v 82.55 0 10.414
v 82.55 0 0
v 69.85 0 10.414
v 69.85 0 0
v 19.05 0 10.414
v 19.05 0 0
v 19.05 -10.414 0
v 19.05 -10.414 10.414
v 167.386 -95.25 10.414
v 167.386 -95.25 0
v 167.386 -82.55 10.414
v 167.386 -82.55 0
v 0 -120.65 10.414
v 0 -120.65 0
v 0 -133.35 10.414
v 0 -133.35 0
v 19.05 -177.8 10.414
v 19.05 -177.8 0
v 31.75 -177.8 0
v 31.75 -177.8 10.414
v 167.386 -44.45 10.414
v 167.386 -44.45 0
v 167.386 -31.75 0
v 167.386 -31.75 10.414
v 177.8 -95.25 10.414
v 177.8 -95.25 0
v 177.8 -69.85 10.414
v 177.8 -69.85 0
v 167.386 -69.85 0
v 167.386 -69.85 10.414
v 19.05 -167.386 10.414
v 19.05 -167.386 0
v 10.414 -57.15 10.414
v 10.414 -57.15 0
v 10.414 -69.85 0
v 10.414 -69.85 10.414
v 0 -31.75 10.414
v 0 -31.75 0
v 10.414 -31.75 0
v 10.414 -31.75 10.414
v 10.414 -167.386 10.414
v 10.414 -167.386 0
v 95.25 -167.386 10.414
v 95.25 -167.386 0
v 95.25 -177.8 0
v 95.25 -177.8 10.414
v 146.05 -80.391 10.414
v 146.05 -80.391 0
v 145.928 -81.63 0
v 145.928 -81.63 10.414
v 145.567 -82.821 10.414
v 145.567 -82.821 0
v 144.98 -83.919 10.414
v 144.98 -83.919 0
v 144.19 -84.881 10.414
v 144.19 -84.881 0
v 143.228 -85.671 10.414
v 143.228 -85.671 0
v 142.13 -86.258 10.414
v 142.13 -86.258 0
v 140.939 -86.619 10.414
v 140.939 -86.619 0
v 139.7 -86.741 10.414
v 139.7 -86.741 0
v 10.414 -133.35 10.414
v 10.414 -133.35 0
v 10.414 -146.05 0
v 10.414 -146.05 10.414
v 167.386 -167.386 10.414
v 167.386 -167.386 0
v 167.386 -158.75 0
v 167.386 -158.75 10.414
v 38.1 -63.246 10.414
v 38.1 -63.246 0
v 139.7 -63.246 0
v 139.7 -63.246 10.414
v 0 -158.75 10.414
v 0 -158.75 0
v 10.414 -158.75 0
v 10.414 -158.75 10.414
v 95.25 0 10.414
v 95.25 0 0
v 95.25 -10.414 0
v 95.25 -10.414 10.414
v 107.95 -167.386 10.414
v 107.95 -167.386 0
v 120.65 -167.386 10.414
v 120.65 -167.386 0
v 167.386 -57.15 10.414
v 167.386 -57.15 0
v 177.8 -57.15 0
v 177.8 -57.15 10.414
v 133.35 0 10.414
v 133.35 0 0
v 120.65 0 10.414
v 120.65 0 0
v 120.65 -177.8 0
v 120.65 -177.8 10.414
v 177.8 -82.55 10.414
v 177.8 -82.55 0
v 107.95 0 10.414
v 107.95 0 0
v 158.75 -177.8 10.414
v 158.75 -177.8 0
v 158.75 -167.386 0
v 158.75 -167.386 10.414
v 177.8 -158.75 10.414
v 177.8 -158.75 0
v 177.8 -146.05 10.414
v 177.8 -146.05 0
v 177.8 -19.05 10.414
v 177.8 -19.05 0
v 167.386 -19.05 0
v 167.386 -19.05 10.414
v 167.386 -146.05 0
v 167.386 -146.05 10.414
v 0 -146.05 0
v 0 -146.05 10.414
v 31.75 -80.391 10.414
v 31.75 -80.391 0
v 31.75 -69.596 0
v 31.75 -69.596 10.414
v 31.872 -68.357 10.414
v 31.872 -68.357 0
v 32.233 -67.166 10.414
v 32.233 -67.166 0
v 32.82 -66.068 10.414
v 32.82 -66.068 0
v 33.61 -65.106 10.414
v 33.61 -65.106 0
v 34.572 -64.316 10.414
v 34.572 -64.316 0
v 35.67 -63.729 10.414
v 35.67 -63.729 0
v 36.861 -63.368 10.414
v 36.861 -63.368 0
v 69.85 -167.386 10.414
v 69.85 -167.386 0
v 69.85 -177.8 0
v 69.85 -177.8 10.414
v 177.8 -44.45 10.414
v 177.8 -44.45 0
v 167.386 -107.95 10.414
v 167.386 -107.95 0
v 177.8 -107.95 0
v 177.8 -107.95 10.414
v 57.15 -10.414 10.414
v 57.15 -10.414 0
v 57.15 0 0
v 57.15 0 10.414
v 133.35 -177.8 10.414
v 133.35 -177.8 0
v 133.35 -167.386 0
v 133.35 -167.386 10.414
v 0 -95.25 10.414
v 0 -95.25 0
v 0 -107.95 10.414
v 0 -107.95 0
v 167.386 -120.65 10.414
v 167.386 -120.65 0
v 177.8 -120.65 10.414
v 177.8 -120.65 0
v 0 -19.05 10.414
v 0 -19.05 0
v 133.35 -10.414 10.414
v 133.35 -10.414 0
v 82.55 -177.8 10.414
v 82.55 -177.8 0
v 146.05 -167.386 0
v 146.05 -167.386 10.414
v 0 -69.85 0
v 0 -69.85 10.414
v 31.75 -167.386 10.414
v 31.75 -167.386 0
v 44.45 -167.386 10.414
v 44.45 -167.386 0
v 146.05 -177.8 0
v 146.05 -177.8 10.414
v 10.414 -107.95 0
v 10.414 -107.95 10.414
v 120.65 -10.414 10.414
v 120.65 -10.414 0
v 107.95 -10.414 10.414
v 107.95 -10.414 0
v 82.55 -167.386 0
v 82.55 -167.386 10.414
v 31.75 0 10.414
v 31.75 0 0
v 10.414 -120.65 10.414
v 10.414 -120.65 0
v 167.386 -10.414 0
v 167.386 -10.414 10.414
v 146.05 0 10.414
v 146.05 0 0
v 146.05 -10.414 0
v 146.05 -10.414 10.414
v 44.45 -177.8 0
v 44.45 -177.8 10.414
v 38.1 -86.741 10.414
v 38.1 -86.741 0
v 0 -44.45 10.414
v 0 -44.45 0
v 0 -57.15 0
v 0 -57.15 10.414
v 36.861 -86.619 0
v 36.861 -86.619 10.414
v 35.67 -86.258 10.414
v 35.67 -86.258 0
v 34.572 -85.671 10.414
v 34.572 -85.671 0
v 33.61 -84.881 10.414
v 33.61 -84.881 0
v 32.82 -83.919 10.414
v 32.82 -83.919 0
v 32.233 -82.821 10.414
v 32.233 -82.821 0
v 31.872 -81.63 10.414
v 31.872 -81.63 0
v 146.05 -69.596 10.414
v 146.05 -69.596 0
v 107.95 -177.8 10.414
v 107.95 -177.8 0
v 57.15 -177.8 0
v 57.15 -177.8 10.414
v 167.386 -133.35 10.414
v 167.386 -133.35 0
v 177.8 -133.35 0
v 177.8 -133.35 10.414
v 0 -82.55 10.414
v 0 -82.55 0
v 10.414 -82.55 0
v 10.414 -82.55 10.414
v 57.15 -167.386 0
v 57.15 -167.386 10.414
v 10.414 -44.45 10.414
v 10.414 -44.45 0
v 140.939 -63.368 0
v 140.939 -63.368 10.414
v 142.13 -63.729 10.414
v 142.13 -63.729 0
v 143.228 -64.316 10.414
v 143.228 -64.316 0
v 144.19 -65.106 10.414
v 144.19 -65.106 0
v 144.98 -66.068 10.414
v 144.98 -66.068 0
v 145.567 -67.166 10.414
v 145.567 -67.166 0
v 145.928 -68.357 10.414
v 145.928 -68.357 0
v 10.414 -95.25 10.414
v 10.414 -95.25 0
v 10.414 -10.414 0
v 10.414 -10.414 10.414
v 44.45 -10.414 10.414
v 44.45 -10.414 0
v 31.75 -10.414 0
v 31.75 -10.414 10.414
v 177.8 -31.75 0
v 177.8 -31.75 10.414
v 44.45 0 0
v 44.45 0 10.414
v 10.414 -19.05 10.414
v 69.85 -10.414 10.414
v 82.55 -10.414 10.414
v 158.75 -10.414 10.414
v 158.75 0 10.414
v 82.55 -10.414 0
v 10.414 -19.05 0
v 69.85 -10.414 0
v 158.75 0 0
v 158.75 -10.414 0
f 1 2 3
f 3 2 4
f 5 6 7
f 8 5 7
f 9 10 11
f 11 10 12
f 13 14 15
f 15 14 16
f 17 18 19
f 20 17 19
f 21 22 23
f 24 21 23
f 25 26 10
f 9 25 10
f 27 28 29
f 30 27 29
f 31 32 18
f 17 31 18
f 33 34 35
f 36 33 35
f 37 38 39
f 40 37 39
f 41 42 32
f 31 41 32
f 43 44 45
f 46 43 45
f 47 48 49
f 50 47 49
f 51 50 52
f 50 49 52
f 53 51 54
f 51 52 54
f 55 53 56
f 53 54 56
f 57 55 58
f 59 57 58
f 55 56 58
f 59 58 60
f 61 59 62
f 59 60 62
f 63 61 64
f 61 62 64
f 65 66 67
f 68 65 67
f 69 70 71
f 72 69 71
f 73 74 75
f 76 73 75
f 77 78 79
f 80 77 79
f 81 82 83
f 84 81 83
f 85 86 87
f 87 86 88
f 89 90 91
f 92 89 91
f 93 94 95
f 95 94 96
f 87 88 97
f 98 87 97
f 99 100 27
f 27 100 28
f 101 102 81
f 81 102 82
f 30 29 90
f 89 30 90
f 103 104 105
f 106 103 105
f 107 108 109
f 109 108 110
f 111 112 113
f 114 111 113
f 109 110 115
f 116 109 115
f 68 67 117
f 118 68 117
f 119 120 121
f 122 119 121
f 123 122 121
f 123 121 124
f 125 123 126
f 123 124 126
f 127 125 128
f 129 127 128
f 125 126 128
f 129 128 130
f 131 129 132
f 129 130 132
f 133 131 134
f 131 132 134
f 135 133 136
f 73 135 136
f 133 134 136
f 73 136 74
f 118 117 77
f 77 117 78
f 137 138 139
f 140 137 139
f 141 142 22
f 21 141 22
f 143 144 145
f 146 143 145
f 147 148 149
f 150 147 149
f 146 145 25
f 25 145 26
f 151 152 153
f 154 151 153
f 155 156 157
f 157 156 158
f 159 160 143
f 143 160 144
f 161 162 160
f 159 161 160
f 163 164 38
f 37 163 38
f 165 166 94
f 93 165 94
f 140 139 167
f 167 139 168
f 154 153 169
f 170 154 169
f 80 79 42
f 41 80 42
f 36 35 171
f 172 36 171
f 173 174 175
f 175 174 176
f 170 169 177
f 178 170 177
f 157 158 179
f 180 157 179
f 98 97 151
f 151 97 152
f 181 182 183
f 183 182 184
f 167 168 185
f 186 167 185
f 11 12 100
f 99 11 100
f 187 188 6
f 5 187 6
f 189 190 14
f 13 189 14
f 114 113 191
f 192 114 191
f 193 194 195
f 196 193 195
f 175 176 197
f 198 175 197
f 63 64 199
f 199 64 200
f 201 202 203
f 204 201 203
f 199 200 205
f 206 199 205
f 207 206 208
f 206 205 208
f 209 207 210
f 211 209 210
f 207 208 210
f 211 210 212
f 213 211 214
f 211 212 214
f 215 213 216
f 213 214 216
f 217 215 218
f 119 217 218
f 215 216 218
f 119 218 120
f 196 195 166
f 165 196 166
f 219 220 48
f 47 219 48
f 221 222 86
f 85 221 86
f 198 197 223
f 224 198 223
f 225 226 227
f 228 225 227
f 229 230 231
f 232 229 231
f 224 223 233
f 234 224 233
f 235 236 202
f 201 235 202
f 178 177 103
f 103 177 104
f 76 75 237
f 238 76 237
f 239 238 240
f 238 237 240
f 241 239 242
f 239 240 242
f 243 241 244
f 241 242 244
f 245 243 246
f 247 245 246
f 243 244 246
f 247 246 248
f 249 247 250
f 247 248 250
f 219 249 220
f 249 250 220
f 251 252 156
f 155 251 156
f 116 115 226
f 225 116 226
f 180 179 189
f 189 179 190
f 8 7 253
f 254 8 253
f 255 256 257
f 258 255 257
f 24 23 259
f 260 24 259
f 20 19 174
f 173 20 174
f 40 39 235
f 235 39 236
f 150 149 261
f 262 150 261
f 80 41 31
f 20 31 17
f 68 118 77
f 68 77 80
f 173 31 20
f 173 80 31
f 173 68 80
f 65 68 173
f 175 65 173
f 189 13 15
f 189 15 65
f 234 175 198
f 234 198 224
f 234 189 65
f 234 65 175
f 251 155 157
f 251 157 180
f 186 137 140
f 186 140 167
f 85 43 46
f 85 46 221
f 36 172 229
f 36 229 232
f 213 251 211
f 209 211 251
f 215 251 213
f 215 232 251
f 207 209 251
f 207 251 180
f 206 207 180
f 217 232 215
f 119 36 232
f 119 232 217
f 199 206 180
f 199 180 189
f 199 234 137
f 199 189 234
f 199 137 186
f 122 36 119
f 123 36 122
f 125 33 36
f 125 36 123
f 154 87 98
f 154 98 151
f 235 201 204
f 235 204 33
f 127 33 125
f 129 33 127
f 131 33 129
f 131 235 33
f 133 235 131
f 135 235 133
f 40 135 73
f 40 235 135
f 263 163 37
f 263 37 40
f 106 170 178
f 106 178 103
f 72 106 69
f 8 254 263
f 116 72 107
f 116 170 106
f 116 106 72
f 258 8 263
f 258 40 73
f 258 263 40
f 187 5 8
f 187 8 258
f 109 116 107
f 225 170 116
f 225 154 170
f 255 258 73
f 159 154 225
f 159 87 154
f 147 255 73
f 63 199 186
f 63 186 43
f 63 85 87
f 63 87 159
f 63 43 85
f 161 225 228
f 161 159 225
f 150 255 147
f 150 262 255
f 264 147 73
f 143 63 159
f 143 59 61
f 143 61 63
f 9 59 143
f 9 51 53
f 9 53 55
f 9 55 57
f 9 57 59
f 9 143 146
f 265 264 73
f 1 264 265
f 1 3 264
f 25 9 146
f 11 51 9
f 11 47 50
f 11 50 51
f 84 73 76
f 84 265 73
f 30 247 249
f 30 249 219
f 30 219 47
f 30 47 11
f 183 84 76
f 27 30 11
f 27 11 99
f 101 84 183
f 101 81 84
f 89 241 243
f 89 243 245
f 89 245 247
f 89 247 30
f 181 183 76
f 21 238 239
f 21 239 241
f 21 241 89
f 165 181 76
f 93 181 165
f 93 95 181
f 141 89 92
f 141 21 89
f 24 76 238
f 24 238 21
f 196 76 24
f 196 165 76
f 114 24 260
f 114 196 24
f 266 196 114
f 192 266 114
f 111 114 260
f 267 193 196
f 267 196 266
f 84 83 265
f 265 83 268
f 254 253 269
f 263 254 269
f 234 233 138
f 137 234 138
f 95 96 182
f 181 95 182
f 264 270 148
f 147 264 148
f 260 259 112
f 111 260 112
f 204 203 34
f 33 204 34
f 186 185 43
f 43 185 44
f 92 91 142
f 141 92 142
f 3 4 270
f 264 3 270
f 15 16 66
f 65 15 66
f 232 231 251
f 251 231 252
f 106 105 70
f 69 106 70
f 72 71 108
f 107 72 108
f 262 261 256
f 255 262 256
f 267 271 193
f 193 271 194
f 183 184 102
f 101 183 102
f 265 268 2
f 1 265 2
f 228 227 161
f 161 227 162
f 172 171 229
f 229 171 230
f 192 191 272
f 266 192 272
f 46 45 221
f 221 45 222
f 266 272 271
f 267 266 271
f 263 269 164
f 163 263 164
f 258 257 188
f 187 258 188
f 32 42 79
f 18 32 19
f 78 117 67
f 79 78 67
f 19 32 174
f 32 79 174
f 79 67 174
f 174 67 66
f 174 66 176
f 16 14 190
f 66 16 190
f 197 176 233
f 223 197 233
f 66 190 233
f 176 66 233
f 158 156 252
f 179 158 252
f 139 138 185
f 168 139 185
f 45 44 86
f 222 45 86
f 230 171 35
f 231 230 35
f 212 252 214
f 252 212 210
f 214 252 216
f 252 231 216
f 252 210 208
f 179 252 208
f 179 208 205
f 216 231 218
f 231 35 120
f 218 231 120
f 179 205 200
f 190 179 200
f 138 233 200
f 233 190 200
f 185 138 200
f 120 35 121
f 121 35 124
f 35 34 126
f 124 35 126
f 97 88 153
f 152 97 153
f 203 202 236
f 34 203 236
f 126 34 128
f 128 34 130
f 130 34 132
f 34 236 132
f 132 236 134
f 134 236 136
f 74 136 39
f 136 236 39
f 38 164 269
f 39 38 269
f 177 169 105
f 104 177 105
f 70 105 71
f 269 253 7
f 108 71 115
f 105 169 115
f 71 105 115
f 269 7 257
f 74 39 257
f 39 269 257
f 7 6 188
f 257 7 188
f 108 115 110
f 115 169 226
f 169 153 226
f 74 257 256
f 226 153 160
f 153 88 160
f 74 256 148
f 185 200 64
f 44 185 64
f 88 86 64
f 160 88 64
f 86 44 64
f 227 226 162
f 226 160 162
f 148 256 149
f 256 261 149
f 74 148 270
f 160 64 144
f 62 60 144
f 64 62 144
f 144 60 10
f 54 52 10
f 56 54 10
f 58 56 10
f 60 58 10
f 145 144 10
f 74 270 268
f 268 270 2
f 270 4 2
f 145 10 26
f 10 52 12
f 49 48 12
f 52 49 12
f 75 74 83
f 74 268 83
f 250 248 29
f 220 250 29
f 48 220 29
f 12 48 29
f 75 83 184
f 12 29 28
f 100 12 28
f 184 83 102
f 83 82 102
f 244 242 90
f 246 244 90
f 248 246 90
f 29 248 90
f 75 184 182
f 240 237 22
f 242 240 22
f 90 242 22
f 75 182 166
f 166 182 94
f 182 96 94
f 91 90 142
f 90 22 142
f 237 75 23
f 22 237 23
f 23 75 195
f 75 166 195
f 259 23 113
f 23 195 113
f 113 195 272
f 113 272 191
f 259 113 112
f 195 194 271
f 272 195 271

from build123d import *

# Parameters (mm, degrees)
F1_DEPTH = 10.414


with BuildPart() as f1:
    # F0 (on Top) → F1 (new body)
    with BuildSketch(Plane.XY):
        Polygon((31.75, 0), (19.05, 0), (19.05, -10.414), (10.414, -10.414), (10.414, -19.05), (0, -19.05), (0, -31.75), (10.414, -31.75), (10.414, -44.45), (0, -44.45), (0, -57.15), (10.414, -57.15), (10.414, -69.85), (0, -69.85), (0, -82.55), (10.414, -82.55), (10.414, -95.25), (0, -95.25), (0, -107.95), (10.414, -107.95), (10.414, -120.65), (0, -120.65), (0, -133.35), (10.414, -133.35), (10.414, -146.05), (0, -146.05), (0, -158.75), (10.414, -158.75), (10.414, -167.386), (19.05, -167.386), (19.05, -177.8), (31.75, -177.8), (31.75, -167.386), (44.45, -167.386), (44.45, -177.8), (57.15, -177.8), (57.15, -167.386), (69.85, -167.386), (69.85, -177.8), (82.55, -177.8), (82.55, -167.386), (95.25, -167.386), (95.25, -177.8), (107.95, -177.8), (107.95, -167.386), (120.65, -167.386), (120.65, -177.8), (133.35, -177.8), (133.35, -167.386), (146.05, -167.386), (146.05, -177.8), (158.75, -177.8), (158.75, -167.386), (167.386, -167.386), (167.386, -158.75), (177.8, -158.75), (177.8, -146.05), (167.386, -146.05), (167.386, -133.35), (177.8, -133.35), (177.8, -120.65), (167.386, -120.65), (167.386, -107.95), (177.8, -107.95), (177.8, -95.25), (167.386, -95.25), (167.386, -82.55), (177.8, -82.55), (177.8, -69.85), (167.386, -69.85), (167.386, -57.15), (177.8, -57.15), (177.8, -44.45), (167.386, -44.45), (167.386, -31.75), (177.8, -31.75), (177.8, -19.05), (167.386, -19.05), (167.386, -10.414), (158.75, -10.414), (158.75, 0), (146.05, 0), (146.05, -10.414), (133.35, -10.414), (133.35, 0), (120.65, 0), (120.65, -10.414), (107.95, -10.414), (107.95, 0), (95.25, 0), (95.25, -10.414), (82.55, -10.414), (82.55, 0), (69.85, 0), (69.85, -10.414), (57.15, -10.414), (57.15, 0), (44.45, 0), (44.45, -10.414), (31.75, -10.414), align=None)
        with BuildLine():
            ThreePointArc((31.75, -69.596), (33.609872, -65.105872), (38.1, -63.246))
            Line((38.1, -63.246), (139.7, -63.246))
            ThreePointArc((139.7, -63.246), (144.190128, -65.105872), (146.05, -69.596))
            Line((146.05, -69.596), (146.05, -80.391))
            ThreePointArc((146.05, -80.391), (144.190128, -84.881128), (139.7, -86.741))
            Line((139.7, -86.741), (38.1, -86.741))
            ThreePointArc((38.1, -86.741), (33.609872, -84.881128), (31.75, -80.391))
            Line((31.75, -80.391), (31.75, -69.596))
        make_face(mode=Mode.SUBTRACT)
    extrude(amount=F1_DEPTH)


solid = f1.part
